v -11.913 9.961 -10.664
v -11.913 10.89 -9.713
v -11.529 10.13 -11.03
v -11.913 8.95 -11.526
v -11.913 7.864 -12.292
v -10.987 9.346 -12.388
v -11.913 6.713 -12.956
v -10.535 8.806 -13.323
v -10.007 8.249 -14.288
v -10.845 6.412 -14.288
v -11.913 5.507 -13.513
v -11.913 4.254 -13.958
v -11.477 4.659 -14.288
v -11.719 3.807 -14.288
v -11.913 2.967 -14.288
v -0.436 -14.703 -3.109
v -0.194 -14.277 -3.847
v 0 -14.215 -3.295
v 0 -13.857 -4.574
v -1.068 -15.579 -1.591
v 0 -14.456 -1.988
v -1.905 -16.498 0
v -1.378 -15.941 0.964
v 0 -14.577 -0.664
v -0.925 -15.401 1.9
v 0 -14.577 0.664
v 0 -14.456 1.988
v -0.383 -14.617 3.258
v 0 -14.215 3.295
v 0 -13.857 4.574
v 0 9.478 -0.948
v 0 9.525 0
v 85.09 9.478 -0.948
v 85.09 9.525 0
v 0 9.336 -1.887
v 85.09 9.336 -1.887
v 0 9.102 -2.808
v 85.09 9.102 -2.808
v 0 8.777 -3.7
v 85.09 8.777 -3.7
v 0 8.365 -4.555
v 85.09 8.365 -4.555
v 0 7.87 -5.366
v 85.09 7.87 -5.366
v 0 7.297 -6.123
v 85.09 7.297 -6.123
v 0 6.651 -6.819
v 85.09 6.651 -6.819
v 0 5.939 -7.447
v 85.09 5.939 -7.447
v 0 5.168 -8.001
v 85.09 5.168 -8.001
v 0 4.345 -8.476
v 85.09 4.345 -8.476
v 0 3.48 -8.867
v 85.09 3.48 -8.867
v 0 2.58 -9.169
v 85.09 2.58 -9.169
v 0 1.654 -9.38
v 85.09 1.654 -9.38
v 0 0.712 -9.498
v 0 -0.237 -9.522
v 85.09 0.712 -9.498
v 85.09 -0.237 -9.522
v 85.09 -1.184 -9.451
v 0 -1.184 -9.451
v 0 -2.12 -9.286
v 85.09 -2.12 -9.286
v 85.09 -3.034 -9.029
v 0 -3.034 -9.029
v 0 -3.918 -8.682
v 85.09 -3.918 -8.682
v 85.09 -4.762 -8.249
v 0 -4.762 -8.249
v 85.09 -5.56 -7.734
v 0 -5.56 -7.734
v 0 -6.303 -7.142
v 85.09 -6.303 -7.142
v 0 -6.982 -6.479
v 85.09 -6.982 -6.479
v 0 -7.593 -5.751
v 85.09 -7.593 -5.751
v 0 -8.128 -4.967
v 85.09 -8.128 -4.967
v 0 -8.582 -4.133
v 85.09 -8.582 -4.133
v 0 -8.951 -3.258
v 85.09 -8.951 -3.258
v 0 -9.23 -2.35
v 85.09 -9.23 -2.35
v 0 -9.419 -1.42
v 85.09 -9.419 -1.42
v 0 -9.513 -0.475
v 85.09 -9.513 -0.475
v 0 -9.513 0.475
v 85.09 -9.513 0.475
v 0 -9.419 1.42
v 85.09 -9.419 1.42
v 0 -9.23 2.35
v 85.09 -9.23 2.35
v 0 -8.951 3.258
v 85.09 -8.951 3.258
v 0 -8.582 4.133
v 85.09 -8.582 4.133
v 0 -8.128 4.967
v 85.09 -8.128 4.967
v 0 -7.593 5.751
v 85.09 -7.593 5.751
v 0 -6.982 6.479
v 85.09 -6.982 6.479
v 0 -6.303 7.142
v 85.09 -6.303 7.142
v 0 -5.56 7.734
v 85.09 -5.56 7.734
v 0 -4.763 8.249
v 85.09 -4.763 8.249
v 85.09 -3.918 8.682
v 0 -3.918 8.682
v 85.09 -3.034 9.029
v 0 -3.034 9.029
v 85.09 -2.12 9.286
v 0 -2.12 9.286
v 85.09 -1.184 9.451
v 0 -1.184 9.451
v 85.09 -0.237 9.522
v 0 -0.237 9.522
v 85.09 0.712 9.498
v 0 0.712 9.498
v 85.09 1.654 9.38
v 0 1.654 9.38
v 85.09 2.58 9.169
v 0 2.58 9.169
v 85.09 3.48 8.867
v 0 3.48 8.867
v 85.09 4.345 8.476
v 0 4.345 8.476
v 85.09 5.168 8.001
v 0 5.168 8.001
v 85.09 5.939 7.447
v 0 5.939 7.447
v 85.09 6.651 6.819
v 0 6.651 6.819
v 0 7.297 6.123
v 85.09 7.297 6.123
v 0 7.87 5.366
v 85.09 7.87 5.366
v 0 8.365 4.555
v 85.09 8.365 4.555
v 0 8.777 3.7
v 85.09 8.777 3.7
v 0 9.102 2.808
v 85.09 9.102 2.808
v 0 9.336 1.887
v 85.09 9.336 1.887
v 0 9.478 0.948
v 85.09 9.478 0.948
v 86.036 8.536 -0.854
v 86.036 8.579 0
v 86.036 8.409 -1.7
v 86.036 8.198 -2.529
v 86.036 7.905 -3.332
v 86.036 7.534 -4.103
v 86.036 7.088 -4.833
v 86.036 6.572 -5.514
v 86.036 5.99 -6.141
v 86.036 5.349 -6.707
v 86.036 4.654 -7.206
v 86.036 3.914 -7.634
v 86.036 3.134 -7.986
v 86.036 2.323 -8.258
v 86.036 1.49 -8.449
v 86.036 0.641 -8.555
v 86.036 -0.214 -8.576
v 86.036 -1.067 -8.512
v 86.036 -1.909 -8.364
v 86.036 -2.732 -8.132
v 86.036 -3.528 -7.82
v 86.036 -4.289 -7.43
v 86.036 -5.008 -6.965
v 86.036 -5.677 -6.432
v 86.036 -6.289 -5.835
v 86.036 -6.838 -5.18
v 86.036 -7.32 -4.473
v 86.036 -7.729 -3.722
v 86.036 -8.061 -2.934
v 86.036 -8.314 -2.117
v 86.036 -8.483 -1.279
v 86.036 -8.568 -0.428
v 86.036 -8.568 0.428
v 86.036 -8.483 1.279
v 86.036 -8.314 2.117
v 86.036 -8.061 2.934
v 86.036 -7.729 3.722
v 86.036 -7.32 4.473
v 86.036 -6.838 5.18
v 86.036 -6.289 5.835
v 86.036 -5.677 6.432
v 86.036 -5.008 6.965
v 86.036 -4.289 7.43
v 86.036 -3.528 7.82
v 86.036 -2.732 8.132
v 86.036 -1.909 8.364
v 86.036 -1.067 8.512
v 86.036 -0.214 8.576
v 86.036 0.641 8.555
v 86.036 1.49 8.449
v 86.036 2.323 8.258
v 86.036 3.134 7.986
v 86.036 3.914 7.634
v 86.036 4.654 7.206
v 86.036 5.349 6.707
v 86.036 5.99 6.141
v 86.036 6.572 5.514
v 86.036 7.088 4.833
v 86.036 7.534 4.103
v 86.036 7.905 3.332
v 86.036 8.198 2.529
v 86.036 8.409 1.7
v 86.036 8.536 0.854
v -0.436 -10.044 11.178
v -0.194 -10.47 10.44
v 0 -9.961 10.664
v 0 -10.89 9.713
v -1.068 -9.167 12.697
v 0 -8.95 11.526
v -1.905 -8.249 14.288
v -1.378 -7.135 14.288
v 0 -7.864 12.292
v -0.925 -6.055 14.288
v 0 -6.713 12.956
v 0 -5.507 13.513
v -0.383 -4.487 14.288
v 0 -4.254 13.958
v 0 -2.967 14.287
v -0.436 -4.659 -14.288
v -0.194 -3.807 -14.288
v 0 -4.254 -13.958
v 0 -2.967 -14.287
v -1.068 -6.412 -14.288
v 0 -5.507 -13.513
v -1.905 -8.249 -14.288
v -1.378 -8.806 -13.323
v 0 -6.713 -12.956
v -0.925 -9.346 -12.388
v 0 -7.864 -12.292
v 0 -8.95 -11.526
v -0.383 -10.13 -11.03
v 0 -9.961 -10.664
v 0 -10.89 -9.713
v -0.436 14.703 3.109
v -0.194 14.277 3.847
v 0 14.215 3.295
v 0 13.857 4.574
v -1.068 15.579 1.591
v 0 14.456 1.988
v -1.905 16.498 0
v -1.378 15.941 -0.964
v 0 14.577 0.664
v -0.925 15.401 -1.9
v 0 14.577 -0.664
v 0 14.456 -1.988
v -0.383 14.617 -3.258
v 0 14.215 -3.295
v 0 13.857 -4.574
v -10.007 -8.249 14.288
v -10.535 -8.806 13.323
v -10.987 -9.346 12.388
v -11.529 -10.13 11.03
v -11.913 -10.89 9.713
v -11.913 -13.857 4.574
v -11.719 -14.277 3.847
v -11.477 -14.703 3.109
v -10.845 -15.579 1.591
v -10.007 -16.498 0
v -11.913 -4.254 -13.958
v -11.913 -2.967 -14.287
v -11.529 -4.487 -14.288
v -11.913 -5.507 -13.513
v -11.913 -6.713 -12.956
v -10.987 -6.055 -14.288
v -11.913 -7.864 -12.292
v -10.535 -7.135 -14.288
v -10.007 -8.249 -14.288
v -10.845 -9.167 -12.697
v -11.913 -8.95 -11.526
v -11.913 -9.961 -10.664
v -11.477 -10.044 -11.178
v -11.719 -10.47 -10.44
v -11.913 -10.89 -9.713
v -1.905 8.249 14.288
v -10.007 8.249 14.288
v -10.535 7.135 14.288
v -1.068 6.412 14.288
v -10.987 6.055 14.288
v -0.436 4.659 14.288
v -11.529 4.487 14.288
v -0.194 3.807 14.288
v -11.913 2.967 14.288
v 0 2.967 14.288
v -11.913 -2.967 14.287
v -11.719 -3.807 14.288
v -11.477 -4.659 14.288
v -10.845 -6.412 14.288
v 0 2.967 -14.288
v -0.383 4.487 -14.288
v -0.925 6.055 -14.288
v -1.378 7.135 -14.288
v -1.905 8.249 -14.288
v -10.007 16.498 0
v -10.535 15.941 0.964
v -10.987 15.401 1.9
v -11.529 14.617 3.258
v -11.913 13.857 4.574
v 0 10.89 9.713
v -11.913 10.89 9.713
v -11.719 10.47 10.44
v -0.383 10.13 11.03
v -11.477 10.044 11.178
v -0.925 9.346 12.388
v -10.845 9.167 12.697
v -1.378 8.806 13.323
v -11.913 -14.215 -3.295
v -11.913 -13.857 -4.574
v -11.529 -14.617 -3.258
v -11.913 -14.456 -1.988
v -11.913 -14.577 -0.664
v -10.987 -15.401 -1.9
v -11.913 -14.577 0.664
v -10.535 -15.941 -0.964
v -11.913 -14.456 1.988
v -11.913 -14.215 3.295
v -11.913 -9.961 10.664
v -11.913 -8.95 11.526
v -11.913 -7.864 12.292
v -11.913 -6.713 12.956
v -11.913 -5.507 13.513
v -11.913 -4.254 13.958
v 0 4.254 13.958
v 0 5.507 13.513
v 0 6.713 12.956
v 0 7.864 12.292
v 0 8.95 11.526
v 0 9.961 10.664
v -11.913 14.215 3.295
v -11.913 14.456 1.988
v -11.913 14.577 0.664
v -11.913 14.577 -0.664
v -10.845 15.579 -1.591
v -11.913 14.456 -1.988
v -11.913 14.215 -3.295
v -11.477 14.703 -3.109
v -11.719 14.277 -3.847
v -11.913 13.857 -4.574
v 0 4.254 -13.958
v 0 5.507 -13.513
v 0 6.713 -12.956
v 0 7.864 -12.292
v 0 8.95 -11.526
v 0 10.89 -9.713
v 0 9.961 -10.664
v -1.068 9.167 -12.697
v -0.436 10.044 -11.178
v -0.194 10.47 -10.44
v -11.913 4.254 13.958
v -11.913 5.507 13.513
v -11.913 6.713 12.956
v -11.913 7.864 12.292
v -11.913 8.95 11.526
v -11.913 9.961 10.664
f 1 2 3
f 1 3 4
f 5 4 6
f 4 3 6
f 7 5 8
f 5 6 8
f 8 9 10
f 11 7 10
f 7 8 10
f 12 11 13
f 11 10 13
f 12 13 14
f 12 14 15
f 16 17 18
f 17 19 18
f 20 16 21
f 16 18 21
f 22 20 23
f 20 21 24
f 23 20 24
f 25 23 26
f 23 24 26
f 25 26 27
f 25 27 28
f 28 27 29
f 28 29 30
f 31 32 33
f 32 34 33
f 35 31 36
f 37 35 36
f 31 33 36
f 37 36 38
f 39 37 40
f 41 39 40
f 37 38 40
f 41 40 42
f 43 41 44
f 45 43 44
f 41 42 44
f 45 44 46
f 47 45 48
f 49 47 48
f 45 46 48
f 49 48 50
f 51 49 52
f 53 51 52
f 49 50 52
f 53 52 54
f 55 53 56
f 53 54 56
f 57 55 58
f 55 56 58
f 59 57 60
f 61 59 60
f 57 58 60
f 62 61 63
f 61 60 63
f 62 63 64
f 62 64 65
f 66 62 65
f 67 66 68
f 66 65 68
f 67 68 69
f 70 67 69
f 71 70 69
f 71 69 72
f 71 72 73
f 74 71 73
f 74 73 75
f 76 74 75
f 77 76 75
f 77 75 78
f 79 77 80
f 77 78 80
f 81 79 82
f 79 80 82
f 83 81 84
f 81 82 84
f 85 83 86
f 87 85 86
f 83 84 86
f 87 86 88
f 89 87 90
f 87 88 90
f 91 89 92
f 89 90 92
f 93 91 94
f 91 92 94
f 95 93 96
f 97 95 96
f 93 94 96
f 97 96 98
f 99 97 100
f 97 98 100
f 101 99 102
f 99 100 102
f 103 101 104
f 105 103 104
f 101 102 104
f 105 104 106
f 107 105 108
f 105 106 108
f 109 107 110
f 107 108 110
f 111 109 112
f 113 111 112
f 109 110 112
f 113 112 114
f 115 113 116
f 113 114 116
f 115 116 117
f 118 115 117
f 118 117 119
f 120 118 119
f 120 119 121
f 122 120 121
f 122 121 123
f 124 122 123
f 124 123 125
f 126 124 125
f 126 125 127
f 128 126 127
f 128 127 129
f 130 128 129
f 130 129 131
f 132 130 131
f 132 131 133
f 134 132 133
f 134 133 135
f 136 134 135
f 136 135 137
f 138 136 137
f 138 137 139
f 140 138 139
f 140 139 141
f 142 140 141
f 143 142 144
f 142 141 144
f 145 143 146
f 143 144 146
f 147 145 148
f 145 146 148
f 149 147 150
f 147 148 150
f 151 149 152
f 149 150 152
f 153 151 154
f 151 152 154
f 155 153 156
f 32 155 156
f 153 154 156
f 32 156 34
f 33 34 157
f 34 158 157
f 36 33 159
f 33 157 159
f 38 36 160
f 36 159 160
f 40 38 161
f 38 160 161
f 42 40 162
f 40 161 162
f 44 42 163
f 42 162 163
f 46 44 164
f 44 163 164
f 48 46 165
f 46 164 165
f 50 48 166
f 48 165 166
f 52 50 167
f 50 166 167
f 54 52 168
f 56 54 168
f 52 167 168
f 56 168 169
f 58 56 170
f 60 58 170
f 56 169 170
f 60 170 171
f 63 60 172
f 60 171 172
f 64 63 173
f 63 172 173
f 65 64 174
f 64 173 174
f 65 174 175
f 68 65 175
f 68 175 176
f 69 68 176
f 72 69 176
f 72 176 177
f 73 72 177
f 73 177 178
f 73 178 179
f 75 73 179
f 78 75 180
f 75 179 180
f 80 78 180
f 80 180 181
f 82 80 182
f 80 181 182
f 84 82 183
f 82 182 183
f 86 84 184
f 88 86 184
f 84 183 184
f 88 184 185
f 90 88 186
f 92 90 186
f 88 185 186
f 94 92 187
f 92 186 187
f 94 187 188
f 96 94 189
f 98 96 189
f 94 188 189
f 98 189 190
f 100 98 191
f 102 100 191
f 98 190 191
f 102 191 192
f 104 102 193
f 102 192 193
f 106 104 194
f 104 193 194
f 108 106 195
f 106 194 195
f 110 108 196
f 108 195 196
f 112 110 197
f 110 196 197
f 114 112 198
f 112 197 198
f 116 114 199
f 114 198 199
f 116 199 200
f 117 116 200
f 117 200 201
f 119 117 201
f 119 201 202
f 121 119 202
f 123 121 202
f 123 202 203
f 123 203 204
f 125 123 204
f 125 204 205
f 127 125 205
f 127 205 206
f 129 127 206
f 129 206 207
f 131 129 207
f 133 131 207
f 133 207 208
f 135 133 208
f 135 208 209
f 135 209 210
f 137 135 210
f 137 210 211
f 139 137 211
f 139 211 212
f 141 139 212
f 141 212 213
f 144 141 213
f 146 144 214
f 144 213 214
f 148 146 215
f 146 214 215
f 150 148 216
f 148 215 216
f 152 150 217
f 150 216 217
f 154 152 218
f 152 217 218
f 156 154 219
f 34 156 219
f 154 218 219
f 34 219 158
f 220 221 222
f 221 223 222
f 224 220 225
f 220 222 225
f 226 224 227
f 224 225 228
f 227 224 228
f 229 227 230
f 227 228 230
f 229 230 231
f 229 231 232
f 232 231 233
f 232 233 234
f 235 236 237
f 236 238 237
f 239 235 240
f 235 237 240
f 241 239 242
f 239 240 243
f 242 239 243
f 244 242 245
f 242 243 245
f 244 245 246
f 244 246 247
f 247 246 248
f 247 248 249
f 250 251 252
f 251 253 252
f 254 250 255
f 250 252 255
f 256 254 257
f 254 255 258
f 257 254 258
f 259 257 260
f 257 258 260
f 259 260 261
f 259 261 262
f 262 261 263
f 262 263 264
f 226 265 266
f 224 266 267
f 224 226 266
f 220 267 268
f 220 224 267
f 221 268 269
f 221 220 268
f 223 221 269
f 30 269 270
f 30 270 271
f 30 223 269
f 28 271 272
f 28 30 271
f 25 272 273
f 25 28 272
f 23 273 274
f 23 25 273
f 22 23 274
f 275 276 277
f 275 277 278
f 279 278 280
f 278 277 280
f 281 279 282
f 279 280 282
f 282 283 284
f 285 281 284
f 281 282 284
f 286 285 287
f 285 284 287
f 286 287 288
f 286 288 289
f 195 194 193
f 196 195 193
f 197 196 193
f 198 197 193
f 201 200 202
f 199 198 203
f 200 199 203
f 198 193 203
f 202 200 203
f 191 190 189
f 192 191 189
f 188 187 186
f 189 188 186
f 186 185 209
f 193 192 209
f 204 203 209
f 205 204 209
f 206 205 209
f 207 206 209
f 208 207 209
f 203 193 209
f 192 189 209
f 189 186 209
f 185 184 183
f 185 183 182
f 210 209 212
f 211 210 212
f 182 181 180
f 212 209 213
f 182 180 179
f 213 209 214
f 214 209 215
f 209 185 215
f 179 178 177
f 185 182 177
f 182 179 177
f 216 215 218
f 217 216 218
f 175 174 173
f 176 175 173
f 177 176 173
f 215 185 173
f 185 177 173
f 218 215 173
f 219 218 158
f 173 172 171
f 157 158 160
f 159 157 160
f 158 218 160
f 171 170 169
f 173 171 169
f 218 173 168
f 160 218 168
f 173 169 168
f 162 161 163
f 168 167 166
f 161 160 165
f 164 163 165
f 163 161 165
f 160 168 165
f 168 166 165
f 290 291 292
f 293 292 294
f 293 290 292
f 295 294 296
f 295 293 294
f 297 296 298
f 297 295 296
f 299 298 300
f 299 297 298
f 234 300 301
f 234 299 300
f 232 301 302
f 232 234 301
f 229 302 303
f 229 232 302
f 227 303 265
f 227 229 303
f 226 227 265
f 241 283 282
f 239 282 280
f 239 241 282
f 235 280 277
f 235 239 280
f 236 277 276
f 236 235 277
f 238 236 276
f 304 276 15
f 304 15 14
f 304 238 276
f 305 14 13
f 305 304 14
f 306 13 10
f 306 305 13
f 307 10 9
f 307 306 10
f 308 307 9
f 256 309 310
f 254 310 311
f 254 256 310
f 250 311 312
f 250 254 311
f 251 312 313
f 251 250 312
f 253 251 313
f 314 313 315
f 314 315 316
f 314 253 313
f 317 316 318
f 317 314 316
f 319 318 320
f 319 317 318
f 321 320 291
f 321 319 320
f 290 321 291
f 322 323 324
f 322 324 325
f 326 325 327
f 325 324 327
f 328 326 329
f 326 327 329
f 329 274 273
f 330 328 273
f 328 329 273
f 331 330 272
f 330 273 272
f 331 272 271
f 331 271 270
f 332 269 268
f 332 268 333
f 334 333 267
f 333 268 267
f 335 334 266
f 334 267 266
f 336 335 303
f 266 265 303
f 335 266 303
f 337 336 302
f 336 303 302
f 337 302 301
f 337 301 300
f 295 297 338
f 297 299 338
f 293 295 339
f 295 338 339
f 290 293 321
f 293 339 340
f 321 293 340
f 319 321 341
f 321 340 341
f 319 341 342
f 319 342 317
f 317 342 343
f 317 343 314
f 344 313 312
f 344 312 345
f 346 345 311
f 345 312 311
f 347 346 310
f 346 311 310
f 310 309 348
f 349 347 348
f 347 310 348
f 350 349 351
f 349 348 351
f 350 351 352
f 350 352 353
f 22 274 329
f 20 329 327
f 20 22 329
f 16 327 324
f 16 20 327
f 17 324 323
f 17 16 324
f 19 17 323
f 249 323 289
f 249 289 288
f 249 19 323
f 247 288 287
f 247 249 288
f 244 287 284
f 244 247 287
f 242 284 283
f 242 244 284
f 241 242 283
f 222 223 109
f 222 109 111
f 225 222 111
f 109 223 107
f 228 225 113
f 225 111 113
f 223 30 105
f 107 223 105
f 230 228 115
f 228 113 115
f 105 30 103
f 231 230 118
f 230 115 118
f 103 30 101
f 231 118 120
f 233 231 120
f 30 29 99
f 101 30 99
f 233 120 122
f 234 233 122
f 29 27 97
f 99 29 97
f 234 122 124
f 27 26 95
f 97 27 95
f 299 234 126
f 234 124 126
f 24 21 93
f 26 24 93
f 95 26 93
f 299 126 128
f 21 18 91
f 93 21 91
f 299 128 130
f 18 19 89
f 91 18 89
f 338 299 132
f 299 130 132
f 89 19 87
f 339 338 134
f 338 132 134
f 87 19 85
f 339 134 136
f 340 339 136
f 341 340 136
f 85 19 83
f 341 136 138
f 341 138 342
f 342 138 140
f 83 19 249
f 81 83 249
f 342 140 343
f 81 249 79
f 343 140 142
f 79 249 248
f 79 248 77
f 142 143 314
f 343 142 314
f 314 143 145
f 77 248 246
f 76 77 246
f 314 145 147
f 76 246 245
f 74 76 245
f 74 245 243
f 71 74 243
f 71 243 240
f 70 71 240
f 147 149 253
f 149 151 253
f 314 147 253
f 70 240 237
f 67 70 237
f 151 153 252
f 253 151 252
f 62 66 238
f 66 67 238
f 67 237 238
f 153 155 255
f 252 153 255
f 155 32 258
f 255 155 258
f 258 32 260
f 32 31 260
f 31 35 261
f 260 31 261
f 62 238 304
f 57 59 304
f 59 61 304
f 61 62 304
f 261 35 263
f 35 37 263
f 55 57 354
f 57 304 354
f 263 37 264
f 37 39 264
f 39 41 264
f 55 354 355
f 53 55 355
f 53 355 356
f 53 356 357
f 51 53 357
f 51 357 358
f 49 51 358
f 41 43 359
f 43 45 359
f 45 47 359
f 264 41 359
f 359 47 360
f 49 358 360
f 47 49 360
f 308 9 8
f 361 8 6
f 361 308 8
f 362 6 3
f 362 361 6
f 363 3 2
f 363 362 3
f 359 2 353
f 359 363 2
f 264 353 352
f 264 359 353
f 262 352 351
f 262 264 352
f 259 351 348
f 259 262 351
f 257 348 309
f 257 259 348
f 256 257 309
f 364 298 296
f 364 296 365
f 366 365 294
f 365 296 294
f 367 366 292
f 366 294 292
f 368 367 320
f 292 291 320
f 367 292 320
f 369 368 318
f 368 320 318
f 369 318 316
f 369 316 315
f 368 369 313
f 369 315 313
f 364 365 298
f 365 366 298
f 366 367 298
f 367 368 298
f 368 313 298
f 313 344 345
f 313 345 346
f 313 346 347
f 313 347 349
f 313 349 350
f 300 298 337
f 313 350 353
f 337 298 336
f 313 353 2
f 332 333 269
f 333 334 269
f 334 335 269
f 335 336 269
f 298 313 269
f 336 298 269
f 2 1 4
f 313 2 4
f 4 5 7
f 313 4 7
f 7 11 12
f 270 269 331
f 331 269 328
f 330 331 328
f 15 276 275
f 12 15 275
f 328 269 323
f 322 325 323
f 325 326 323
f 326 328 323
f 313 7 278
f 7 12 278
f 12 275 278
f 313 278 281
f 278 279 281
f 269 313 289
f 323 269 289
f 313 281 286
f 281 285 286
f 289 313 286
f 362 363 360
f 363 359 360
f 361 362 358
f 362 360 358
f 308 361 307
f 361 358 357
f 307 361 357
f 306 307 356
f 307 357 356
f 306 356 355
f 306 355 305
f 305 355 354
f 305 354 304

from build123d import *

# Parameters (mm, degrees)
ESBO_O2_R             = 28.575
CORTE_EXTRUS_O1_DEPTH = 11.9126


with BuildPart() as part:
    # Esboço1 → Revolução1 (revolve)
    with BuildSketch(Plane.XY):
        Polygon((-11.9126, 0), (-11.9126, 14.5923), (-9.4996, 17.0053), (-2.413, 17.0053), (0, 14.5923), (0, 9.525), (85.09, 9.525), (86.03615, 8.57885), (86.03615, 0), align=None)
    revolve(axis=Axis((86.03615, 0, 0), (-1, 0, 0)))

    # Esboço2 → Corte-extrusão1 (cut)
    with BuildSketch(Plane(origin=(0, 0, 0), x_dir=(0, 0, -1), z_dir=(1, 0, 0))):
        Circle(ESBO_O2_R)
        Polygon((-14.2875, -8.248891971), (0, -16.497783942), (14.2875, -8.248891971), (14.2875, 8.248891971), (0, 16.497783942), (-14.2875, 8.248891971), align=None, mode=Mode.SUBTRACT)
    extrude(amount=-CORTE_EXTRUS_O1_DEPTH, mode=Mode.SUBTRACT)


solid = part.part
